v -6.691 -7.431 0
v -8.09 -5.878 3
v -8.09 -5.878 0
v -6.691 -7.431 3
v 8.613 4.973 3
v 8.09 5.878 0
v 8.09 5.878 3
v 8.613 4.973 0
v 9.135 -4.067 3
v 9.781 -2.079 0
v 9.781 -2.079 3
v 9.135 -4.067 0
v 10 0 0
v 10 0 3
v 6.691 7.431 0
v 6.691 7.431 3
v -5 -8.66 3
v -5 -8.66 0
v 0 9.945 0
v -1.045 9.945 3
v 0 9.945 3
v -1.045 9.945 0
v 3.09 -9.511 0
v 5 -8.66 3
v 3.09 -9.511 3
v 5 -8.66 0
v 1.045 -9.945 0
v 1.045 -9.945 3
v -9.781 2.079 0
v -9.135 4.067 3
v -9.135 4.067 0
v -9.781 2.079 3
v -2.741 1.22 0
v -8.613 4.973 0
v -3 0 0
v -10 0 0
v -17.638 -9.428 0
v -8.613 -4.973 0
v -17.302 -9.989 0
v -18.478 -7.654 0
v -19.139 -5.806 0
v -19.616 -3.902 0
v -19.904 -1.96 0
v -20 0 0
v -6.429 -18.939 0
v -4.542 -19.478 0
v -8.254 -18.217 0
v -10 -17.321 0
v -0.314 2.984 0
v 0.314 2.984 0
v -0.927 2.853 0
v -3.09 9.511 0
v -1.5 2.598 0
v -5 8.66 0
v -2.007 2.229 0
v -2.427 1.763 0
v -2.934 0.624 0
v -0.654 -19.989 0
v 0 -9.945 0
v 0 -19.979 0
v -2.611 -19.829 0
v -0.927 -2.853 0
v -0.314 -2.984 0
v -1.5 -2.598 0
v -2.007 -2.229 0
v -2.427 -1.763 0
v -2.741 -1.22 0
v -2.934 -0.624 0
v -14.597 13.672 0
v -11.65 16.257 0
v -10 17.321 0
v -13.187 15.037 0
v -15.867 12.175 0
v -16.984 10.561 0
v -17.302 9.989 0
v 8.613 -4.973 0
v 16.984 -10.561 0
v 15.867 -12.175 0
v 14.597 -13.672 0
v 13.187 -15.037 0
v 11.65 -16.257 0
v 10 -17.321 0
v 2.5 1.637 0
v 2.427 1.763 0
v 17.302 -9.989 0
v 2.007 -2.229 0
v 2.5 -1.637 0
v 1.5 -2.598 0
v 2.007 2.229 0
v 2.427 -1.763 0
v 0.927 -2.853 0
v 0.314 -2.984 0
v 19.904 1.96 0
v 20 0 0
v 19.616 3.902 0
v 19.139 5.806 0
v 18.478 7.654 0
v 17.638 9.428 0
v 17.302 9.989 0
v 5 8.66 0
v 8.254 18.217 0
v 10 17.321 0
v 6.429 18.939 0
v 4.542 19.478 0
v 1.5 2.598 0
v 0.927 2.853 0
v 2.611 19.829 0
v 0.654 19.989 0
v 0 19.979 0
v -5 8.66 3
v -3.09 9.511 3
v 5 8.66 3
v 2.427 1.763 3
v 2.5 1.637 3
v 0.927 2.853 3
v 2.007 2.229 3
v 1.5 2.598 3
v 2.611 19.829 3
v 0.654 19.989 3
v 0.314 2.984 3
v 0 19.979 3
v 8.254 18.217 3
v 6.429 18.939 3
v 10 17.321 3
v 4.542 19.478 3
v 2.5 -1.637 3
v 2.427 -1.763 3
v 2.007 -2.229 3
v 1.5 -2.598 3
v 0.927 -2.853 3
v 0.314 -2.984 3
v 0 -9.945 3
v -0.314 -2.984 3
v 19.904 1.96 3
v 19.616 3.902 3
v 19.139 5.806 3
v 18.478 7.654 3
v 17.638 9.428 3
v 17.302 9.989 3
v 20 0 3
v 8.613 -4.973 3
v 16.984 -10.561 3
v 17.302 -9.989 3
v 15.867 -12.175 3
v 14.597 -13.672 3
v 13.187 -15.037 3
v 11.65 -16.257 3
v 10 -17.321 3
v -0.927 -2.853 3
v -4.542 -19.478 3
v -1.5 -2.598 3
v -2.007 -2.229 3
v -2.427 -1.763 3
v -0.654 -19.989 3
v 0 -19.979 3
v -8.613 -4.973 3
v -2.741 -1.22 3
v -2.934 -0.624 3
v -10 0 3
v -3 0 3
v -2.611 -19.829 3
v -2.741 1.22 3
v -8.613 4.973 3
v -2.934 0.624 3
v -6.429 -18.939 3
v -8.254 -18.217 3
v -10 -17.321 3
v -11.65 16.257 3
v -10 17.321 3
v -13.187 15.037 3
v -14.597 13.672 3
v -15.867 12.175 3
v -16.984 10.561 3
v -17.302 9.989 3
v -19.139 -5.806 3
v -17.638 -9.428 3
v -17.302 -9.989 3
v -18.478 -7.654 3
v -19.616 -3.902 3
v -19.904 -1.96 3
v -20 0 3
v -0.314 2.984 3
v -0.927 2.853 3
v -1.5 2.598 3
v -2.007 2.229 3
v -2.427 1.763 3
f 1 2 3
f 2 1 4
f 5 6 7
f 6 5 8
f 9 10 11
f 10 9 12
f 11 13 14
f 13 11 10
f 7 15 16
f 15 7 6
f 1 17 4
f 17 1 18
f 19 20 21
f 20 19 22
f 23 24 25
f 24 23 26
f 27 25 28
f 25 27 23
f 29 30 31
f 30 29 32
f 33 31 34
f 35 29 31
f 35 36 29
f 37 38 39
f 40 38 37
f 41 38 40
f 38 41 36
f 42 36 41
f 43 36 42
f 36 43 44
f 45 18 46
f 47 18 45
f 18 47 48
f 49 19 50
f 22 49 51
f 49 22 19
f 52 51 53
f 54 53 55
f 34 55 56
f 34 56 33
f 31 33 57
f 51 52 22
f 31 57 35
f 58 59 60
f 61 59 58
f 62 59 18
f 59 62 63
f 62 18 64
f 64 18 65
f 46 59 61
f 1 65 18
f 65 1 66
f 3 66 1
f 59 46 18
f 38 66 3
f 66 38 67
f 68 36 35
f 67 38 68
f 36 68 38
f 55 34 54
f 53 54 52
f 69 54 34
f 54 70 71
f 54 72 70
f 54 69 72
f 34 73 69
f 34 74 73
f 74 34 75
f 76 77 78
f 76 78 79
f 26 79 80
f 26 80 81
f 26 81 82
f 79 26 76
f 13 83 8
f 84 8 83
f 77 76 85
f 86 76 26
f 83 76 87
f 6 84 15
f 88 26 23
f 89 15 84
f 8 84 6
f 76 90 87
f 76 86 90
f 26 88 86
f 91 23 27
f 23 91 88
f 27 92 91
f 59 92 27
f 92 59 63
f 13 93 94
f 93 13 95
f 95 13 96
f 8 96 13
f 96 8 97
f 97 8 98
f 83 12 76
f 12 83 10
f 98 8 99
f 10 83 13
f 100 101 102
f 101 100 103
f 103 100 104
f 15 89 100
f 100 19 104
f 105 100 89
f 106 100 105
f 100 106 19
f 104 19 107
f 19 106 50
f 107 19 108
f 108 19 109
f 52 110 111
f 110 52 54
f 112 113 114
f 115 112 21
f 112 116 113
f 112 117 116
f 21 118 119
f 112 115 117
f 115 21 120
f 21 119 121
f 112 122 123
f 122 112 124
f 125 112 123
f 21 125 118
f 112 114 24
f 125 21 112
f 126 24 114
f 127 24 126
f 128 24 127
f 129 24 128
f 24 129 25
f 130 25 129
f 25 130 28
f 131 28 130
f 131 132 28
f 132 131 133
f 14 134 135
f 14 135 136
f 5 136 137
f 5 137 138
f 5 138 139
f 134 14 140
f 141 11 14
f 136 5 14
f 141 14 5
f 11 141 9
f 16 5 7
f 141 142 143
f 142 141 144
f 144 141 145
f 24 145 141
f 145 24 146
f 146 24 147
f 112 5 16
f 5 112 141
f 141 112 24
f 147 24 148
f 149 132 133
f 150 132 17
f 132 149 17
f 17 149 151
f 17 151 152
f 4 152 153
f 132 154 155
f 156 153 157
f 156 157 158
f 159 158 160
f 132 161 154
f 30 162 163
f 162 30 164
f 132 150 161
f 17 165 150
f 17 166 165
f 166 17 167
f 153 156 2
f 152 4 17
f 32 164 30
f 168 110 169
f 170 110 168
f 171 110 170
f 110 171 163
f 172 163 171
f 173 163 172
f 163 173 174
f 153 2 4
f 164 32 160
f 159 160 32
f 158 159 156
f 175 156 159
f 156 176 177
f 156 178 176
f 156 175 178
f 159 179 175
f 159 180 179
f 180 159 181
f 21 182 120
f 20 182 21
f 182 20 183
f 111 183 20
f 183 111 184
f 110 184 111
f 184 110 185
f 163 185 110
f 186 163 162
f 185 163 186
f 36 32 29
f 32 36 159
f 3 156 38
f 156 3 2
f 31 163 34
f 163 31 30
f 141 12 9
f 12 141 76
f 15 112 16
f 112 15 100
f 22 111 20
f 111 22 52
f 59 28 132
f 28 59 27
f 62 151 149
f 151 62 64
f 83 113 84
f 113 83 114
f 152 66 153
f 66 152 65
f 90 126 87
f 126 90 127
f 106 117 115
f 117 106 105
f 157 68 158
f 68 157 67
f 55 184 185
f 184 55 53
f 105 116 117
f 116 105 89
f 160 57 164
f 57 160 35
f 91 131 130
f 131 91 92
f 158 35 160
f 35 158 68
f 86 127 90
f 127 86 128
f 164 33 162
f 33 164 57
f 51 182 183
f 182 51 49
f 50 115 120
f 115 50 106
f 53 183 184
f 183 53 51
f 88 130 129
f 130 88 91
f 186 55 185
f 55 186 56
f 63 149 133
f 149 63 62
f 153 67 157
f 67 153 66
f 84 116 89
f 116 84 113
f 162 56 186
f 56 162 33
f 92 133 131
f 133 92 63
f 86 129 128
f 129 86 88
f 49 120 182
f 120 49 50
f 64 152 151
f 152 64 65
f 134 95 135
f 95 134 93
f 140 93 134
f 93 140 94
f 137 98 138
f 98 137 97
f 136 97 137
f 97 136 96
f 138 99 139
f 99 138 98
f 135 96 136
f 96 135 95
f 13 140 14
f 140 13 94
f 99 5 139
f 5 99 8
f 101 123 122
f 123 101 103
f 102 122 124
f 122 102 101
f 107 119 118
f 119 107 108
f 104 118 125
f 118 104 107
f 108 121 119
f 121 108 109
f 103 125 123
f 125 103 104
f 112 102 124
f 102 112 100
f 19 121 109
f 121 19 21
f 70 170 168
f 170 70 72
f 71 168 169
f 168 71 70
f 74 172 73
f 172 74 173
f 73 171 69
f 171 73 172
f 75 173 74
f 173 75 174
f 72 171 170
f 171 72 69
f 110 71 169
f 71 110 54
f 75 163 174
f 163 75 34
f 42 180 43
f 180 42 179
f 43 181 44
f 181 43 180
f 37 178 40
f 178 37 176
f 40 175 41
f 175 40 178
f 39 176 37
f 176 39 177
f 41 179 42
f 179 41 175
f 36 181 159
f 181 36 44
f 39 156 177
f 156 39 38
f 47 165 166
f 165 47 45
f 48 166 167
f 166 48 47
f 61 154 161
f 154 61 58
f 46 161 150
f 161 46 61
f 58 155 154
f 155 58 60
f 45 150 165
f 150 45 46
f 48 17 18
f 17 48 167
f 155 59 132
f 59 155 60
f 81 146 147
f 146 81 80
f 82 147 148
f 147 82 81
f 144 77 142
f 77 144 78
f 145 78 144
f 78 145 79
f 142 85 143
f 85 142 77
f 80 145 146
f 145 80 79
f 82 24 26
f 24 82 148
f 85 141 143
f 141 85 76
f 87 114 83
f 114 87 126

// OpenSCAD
$fn=30;

height=3;

module pie_slice(h=2,ri=0.0,ro=3.0,a=15) {
	$fn=64;
	difference() {
		intersection() {
			cylinder(h=h, r1=ro, r2=ro, center=true);
			cube([ro,ro,h],false);
	    	rotate(a-90) cube([ro,ro,h],false);
		}
      cylinder(h=h, r1=ri, r2=ri);
	}
}

// Create inner hole for axis
difference() {
	cylinder(height, 10, 10);
	cylinder(height, 3, 3);
}
// Correct for nodge
translate([2.5, -3, 0]) {
	cube([3, 6, height]);
}

// Place 'wings'
for(angle = [0: 60: 320]) {
	rotate(angle) {
		pie_slice(h=2*height,ri=9,ro=20,a=30);
	}
}
